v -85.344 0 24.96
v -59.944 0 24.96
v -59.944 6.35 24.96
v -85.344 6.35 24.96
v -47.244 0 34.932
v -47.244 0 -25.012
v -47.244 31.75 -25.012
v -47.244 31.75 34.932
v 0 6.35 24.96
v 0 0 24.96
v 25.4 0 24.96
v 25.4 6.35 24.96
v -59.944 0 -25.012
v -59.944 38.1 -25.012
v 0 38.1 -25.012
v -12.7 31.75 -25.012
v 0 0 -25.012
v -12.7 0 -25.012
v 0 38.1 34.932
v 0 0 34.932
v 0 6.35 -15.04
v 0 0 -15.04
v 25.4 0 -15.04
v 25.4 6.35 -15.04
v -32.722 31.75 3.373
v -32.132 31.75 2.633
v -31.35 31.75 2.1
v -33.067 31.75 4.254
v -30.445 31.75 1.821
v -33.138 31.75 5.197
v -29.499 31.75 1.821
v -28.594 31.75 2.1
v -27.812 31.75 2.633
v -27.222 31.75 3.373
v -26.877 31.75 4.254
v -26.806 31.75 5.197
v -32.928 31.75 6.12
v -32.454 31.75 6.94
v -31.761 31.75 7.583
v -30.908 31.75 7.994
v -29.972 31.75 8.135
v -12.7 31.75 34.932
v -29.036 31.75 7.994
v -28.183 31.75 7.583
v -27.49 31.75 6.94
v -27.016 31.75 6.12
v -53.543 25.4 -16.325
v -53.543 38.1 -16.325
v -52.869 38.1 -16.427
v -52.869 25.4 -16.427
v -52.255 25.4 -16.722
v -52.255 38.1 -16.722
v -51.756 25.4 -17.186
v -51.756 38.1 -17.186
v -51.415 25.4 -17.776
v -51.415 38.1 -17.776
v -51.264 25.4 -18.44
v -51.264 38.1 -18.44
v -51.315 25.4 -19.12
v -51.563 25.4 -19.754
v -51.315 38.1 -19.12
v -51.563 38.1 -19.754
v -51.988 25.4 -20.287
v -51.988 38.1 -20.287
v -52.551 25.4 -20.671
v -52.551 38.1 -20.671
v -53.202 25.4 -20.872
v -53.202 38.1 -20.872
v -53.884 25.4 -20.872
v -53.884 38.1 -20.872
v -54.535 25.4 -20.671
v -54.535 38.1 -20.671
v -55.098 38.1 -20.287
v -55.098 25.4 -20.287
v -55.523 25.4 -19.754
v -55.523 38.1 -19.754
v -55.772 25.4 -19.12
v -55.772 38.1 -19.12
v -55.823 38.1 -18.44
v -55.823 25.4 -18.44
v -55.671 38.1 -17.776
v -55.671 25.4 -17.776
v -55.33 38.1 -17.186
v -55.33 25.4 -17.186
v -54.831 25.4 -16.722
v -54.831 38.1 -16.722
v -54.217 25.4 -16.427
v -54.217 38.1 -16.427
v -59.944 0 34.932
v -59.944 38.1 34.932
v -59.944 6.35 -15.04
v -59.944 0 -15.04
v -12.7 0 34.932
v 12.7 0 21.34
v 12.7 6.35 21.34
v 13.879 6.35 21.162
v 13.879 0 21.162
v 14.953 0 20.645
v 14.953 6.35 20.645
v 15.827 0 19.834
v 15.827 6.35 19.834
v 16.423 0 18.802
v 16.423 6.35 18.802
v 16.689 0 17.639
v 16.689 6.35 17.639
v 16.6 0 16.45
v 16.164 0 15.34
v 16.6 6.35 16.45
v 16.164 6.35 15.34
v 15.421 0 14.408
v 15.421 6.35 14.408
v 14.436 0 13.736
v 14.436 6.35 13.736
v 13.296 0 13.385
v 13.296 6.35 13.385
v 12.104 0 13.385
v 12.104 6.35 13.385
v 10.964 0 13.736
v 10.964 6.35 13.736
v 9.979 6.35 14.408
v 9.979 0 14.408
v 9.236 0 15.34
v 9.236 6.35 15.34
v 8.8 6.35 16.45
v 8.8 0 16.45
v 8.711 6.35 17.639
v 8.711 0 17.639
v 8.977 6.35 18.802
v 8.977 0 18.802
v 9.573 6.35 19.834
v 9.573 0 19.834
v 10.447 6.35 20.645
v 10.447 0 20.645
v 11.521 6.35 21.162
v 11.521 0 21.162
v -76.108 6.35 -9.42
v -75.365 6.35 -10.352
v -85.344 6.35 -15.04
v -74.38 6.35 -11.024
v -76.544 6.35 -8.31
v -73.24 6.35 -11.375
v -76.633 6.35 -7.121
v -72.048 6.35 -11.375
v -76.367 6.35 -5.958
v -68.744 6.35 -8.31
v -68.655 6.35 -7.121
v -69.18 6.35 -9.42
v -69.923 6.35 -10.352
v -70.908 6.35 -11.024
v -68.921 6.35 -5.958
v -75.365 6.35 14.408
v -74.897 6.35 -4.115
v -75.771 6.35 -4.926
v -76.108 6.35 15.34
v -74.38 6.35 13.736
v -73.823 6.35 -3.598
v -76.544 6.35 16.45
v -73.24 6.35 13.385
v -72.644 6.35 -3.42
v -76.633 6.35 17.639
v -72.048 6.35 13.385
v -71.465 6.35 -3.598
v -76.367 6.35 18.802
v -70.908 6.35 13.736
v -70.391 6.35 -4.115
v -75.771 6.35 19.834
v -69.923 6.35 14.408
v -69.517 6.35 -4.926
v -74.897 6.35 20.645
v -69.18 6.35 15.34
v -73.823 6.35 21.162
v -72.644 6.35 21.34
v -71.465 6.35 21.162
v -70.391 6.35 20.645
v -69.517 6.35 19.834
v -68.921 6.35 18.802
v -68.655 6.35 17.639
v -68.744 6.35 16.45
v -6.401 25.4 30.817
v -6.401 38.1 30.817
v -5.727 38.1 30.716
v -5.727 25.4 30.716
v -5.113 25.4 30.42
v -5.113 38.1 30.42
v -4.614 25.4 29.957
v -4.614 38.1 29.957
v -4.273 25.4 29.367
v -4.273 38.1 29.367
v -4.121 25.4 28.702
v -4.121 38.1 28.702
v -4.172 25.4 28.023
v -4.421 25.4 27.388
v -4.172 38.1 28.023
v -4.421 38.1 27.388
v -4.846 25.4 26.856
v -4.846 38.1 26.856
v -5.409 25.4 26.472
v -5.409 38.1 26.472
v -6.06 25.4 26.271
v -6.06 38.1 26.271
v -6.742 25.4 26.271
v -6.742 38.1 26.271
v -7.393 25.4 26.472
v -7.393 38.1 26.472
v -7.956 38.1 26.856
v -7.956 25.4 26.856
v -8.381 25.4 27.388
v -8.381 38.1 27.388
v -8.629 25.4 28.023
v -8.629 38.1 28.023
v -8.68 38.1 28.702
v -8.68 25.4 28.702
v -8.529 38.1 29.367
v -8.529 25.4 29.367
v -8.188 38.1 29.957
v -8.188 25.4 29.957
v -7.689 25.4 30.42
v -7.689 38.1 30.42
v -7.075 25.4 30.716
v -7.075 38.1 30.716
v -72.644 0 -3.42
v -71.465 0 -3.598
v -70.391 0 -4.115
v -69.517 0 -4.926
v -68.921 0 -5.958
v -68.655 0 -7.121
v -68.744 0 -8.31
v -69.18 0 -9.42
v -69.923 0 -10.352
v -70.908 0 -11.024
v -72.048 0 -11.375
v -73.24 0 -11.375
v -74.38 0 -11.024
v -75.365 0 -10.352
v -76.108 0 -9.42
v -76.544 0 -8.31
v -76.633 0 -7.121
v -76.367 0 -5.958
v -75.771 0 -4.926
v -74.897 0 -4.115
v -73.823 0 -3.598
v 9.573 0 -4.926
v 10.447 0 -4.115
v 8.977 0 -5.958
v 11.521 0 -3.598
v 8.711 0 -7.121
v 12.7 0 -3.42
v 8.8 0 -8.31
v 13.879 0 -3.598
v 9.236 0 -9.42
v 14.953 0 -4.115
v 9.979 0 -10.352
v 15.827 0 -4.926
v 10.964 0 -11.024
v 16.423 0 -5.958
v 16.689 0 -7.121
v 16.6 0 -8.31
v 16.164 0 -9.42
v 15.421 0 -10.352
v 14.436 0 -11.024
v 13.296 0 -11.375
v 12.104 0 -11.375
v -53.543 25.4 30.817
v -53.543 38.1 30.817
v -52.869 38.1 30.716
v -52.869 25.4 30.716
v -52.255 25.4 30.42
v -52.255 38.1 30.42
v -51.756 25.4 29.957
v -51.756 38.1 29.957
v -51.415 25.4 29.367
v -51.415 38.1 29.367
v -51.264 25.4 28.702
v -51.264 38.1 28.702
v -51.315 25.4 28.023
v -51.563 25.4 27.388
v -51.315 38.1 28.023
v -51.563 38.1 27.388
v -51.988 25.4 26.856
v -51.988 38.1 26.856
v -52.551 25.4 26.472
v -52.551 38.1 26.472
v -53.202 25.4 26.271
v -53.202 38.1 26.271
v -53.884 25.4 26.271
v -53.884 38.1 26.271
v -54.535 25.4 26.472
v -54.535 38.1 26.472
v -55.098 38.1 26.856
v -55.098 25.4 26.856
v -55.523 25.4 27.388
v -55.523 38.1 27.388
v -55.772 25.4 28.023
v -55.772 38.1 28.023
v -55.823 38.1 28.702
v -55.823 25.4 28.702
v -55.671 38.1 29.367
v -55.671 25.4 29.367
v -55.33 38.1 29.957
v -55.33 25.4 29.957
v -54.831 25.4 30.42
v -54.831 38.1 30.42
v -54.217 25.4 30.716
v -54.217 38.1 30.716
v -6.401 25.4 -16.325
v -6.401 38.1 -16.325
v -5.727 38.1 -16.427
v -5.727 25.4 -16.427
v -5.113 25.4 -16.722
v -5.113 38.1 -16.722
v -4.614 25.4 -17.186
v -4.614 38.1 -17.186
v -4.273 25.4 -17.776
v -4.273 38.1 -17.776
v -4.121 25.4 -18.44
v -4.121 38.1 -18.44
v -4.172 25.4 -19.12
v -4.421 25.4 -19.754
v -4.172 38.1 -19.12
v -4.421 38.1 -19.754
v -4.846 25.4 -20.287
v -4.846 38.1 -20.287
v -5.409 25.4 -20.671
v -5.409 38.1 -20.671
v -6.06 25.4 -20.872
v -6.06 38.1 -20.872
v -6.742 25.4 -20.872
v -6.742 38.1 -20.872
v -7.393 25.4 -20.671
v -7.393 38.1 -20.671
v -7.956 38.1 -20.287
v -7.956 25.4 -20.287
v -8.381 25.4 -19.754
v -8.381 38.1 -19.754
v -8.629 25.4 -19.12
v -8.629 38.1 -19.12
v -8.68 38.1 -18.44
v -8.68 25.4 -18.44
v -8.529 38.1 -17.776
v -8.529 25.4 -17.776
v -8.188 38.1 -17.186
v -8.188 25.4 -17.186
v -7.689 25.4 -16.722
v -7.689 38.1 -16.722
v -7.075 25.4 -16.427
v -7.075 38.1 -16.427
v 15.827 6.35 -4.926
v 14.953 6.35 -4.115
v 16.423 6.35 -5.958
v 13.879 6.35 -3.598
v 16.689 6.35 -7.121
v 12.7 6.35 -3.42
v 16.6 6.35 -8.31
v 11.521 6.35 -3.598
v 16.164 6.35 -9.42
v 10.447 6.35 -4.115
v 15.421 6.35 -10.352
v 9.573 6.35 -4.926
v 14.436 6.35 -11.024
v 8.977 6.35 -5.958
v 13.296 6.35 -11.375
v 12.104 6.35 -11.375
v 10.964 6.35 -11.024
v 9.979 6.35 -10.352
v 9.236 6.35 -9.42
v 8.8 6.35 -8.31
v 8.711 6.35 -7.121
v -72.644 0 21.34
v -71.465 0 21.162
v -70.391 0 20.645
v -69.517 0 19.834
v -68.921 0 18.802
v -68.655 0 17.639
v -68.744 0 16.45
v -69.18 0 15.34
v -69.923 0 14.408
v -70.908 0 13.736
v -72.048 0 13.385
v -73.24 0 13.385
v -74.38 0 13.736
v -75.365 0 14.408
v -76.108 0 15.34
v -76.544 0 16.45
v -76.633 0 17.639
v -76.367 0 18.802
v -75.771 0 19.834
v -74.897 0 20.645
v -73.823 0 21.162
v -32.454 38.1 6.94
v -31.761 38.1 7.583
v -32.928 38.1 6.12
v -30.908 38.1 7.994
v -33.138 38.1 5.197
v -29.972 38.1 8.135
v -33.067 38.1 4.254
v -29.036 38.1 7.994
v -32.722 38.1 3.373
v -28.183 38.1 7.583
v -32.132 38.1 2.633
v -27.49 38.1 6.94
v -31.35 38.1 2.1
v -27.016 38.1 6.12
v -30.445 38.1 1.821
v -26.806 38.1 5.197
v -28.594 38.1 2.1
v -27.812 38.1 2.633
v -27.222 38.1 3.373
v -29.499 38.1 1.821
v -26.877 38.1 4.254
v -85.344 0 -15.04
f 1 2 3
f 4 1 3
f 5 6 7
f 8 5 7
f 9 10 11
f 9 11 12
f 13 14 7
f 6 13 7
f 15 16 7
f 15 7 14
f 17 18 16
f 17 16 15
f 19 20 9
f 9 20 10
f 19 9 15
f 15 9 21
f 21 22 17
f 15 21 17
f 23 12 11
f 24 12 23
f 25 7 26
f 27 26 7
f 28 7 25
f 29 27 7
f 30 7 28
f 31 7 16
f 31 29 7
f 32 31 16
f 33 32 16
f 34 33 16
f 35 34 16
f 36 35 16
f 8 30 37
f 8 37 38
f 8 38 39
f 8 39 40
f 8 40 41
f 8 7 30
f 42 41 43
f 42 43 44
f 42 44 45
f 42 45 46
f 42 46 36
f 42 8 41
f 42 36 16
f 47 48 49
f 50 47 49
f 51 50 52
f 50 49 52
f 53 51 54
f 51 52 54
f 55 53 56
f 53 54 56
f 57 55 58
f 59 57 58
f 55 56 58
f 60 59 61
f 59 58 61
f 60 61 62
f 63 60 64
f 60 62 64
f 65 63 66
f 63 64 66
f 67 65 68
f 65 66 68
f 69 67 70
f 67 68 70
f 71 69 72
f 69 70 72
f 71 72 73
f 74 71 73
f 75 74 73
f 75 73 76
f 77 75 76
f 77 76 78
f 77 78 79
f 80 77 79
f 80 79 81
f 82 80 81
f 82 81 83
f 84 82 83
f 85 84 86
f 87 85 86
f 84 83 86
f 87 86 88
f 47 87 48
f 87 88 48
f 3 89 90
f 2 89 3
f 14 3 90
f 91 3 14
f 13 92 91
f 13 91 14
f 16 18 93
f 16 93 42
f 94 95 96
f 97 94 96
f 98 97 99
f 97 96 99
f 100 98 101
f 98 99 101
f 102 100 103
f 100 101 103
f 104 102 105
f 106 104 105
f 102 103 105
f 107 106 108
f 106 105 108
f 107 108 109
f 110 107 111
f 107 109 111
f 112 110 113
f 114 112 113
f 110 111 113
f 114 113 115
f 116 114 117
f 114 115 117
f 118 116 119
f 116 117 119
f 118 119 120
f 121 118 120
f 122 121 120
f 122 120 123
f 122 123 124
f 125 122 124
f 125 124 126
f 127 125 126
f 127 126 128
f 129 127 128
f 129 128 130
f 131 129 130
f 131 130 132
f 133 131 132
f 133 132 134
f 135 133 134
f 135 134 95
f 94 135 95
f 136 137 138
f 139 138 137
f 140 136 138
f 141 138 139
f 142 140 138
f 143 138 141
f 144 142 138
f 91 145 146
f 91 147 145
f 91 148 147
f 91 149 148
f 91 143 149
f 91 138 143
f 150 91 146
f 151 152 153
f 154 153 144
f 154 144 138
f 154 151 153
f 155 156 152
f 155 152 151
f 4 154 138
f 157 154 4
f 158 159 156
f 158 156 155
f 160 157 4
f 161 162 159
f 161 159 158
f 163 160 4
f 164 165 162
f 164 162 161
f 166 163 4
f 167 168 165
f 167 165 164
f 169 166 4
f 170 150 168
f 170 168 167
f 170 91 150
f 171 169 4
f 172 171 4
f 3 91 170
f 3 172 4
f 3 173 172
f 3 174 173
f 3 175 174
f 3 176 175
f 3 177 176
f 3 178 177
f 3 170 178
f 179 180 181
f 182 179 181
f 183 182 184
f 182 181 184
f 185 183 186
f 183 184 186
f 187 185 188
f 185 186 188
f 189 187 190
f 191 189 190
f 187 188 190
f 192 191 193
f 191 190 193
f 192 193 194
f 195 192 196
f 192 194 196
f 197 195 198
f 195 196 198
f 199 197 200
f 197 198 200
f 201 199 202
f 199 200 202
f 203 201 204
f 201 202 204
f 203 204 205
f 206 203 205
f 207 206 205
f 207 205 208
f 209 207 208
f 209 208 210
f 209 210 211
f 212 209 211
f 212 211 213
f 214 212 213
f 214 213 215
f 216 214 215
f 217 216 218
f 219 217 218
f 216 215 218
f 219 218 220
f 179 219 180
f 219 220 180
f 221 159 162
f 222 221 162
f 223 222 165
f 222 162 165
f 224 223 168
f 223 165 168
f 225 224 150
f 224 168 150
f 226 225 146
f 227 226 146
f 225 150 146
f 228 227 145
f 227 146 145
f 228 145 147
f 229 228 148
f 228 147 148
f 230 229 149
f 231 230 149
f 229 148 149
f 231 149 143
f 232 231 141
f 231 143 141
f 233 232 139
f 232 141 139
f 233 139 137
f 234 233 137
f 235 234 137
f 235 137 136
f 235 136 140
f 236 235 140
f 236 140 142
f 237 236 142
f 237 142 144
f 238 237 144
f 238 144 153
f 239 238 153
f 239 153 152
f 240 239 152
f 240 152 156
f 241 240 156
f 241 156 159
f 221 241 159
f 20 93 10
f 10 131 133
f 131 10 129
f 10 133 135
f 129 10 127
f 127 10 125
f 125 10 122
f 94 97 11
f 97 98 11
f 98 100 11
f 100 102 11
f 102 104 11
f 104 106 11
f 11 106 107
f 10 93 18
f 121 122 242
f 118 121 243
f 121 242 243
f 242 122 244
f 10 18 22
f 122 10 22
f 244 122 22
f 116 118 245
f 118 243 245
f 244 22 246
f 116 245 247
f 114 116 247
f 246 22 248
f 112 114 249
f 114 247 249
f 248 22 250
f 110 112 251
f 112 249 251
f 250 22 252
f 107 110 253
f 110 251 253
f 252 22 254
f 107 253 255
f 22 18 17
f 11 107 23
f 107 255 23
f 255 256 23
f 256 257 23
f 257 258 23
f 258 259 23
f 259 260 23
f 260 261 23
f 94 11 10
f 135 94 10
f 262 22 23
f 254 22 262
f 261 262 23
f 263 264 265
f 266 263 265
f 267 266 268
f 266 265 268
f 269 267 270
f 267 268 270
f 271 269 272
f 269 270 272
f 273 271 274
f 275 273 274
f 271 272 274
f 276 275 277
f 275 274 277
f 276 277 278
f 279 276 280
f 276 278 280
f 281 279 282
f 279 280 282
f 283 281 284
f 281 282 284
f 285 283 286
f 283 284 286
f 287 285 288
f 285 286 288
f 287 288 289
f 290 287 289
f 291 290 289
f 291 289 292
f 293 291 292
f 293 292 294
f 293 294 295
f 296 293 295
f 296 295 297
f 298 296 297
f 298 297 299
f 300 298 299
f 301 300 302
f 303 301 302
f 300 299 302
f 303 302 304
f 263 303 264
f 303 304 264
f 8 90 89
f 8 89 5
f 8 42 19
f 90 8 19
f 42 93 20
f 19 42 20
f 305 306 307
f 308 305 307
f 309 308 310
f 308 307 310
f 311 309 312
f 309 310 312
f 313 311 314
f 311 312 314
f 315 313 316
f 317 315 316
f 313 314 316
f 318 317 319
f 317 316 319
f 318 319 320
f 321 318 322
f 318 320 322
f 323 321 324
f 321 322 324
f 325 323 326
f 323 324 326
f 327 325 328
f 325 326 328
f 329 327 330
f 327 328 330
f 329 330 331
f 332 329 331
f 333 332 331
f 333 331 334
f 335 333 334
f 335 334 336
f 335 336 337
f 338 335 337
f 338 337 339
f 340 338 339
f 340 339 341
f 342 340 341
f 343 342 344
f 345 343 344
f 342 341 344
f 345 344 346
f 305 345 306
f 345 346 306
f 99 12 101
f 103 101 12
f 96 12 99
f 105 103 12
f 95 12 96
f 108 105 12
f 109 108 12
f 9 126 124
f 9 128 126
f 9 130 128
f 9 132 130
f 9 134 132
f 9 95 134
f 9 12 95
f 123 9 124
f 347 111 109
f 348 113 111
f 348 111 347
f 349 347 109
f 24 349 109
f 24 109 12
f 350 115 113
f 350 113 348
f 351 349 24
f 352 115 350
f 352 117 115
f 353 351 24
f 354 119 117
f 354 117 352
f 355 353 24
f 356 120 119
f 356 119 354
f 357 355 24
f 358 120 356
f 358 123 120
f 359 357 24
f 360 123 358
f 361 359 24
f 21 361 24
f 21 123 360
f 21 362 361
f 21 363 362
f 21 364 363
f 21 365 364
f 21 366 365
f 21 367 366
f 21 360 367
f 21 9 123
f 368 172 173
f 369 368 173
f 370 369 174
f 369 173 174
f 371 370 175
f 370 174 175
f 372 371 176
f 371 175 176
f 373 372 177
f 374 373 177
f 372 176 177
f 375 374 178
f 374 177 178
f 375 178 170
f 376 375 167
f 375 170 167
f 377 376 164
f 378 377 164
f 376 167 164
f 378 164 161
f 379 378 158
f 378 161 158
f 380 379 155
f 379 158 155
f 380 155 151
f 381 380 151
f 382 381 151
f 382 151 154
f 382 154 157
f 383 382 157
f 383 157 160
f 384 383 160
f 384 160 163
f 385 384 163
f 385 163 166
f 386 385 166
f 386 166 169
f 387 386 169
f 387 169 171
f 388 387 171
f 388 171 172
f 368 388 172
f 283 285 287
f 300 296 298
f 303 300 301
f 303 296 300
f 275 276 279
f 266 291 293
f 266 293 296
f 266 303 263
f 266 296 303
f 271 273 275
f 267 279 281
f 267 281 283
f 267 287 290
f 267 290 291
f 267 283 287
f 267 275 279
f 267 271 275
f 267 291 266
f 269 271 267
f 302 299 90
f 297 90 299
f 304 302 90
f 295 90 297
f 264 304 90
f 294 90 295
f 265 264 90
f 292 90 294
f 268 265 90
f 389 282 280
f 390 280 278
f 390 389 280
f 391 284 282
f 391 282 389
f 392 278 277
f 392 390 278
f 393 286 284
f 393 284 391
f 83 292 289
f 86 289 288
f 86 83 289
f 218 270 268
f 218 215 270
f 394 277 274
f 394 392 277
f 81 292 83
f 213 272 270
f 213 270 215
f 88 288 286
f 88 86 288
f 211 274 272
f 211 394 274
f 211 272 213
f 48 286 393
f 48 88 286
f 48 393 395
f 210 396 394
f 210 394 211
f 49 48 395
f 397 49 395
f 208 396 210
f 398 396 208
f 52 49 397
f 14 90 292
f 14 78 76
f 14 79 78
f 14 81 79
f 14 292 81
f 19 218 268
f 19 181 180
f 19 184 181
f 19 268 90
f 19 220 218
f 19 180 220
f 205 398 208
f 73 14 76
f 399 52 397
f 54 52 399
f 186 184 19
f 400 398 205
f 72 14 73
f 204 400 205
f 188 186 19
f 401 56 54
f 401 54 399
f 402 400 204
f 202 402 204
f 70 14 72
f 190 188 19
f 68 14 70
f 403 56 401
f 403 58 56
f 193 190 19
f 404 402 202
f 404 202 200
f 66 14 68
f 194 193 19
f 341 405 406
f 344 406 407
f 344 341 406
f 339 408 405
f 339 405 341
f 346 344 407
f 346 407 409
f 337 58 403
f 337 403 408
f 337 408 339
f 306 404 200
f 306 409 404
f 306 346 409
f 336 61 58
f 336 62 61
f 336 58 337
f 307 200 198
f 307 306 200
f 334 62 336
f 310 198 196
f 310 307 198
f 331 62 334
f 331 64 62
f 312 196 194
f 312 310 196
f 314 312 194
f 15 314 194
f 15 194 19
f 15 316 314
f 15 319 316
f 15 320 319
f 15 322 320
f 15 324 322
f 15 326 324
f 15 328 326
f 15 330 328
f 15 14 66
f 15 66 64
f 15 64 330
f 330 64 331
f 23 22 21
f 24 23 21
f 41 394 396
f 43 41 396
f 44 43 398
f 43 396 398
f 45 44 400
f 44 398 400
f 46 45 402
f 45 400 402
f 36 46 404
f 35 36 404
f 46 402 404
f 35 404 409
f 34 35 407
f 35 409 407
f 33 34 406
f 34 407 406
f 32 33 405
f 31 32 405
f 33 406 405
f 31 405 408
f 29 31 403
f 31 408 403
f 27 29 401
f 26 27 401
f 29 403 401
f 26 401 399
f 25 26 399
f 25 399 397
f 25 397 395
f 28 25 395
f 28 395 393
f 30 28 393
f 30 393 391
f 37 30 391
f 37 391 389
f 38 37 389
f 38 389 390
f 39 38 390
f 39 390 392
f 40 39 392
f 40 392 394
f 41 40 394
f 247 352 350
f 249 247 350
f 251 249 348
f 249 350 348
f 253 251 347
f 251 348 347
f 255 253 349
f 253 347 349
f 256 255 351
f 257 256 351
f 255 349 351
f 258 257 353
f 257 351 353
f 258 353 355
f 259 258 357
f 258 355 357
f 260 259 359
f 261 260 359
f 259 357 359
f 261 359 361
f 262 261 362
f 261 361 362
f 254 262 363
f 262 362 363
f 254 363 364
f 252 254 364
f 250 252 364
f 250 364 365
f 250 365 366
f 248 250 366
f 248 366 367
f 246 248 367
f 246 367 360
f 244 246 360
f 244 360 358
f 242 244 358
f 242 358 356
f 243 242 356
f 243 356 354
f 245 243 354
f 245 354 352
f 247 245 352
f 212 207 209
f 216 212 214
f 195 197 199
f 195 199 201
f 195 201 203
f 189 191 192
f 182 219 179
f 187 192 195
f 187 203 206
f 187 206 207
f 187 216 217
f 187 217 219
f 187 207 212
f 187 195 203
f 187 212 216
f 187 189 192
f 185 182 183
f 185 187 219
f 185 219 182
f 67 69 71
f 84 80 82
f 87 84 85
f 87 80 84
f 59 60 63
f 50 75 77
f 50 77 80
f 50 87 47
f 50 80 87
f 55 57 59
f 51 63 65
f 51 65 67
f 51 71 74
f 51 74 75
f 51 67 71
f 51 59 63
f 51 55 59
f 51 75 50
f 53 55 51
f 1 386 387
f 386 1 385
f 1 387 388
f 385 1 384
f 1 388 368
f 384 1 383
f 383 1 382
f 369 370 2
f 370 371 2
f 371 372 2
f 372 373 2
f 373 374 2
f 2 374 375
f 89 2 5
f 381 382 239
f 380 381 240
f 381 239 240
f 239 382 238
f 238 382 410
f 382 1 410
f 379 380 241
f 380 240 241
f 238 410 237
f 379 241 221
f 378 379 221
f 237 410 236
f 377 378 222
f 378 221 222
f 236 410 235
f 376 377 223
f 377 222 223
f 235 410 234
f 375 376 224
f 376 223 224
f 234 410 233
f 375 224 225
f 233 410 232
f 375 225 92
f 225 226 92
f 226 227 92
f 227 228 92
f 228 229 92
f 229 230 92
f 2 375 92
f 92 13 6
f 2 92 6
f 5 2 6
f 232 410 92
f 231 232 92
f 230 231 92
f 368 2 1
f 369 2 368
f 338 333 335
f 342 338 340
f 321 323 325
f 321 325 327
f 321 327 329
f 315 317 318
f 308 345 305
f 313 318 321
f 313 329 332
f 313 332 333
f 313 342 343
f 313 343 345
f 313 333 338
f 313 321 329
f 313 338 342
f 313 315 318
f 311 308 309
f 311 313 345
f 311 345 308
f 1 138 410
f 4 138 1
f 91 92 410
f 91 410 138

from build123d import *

# Parameters (mm, degrees)
SKETCH1_W           = 59.944
SKETCH1_H           = 59.944
BOSS_EXTRUDE1_DEPTH = 38.1
SKETCH2_W           = 34.544
SKETCH2_H           = 31.75
CUT_EXTRUDE1_DEPTH  = 93.941789697
SKETCH3_R           = 3.175
CUT_EXTRUDE2_DEPTH  = 80.152691578
SKETCH4_W           = 40
SKETCH4_H           = 6.35
BOSS_EXTRUDE2_DEPTH = 25.4
SKETCH5_W           = 40
SKETCH5_H           = 6.35
BOSS_EXTRUDE3_DEPTH = 25.4
SKETCH6_R           = 4
CUT_EXTRUDE3_DEPTH  = 98.529053538
SKETCH7_R           = 2.286
CUT_EXTRUDE4_DEPTH  = 12.7


with BuildPart() as part:
    # Sketch1 → Boss-Extrude1 (new body)
    with BuildSketch(Plane(origin=(0, 0, 0), x_dir=(1, 0, 0), z_dir=(0, 1, 0))):
        with Locations((-29.972, -4.96015493)):
            Rectangle(SKETCH1_W, SKETCH1_H)
    extrude(amount=BOSS_EXTRUDE1_DEPTH)

    # Sketch2 → Cut-Extrude1 (cut, through all)
    with BuildSketch(Plane.XY.offset(34.93215493)):
        with Locations((-29.972, 15.875)):
            Rectangle(SKETCH2_W, SKETCH2_H)
    extrude(amount=-CUT_EXTRUDE1_DEPTH, mode=Mode.SUBTRACT)

    # Sketch3 → Cut-Extrude2 (cut, through all)
    with BuildSketch(Plane(origin=(0, 38.1, 0), x_dir=(1, 0, 0), z_dir=(0, 1, 0))):
        with Locations(Location((-29.972, -4.96015493, 0), (0, 0, 270))):
            Circle(SKETCH3_R)
    extrude(amount=-CUT_EXTRUDE2_DEPTH, mode=Mode.SUBTRACT)

    # Sketch4 → Boss-Extrude2 (add)
    with BuildSketch(Plane(origin=(0, 0, 0), x_dir=(0, 0, -1), z_dir=(1, 0, 0))):
        with Locations((-4.960154808, 3.175)):
            Rectangle(SKETCH4_W, SKETCH4_H)
    extrude(amount=BOSS_EXTRUDE2_DEPTH)

    # Sketch5 → Boss-Extrude3 (add)
    with BuildSketch(Plane.ZY.offset(59.944)):
        with Locations((4.960154808, 3.175)):
            Rectangle(SKETCH5_W, SKETCH5_H)
    extrude(amount=BOSS_EXTRUDE3_DEPTH)

    # Sketch6 → Cut-Extrude3 (cut, through all)
    with BuildSketch(Plane(origin=(0, 6.35, 0), x_dir=(1, 0, 0), z_dir=(0, 1, 0))):
        with Locations(Location((-72.644, 7.419845192, 0), (0, 0, 270))):
            Circle(SKETCH6_R)
        with Locations(Location((-72.644, -17.340154808, 0), (0, 0, 270))):
            Circle(SKETCH6_R)
        with Locations(Location((12.7, 7.419845192, 0), (0, 0, 270))):
            Circle(SKETCH6_R)
        with Locations(Location((12.7, -17.340154808, 0), (0, 0, 270))):
            Circle(SKETCH6_R)
    extrude(amount=-CUT_EXTRUDE3_DEPTH, mode=Mode.SUBTRACT)

    # Sketch7 → Cut-Extrude4 (cut)
    with BuildSketch(Plane(origin=(0, 38.1, 0), x_dir=(1, 0, 0), z_dir=(0, 1, 0))):
        with Locations(Location((-53.5432, 18.61104507, 0), (0, 0, 270))):
            Circle(SKETCH7_R)
        with Locations(Location((-6.4008, -28.53135493, 0), (0, 0, 270))):
            Circle(SKETCH7_R)
        with Locations(Location((-53.5432, -28.53135493, 0), (0, 0, 270))):
            Circle(SKETCH7_R)
        with Locations(Location((-6.4008, 18.61104507, 0), (0, 0, 270))):
            Circle(SKETCH7_R)
    extrude(amount=-CUT_EXTRUDE4_DEPTH, mode=Mode.SUBTRACT)


solid = part.part
